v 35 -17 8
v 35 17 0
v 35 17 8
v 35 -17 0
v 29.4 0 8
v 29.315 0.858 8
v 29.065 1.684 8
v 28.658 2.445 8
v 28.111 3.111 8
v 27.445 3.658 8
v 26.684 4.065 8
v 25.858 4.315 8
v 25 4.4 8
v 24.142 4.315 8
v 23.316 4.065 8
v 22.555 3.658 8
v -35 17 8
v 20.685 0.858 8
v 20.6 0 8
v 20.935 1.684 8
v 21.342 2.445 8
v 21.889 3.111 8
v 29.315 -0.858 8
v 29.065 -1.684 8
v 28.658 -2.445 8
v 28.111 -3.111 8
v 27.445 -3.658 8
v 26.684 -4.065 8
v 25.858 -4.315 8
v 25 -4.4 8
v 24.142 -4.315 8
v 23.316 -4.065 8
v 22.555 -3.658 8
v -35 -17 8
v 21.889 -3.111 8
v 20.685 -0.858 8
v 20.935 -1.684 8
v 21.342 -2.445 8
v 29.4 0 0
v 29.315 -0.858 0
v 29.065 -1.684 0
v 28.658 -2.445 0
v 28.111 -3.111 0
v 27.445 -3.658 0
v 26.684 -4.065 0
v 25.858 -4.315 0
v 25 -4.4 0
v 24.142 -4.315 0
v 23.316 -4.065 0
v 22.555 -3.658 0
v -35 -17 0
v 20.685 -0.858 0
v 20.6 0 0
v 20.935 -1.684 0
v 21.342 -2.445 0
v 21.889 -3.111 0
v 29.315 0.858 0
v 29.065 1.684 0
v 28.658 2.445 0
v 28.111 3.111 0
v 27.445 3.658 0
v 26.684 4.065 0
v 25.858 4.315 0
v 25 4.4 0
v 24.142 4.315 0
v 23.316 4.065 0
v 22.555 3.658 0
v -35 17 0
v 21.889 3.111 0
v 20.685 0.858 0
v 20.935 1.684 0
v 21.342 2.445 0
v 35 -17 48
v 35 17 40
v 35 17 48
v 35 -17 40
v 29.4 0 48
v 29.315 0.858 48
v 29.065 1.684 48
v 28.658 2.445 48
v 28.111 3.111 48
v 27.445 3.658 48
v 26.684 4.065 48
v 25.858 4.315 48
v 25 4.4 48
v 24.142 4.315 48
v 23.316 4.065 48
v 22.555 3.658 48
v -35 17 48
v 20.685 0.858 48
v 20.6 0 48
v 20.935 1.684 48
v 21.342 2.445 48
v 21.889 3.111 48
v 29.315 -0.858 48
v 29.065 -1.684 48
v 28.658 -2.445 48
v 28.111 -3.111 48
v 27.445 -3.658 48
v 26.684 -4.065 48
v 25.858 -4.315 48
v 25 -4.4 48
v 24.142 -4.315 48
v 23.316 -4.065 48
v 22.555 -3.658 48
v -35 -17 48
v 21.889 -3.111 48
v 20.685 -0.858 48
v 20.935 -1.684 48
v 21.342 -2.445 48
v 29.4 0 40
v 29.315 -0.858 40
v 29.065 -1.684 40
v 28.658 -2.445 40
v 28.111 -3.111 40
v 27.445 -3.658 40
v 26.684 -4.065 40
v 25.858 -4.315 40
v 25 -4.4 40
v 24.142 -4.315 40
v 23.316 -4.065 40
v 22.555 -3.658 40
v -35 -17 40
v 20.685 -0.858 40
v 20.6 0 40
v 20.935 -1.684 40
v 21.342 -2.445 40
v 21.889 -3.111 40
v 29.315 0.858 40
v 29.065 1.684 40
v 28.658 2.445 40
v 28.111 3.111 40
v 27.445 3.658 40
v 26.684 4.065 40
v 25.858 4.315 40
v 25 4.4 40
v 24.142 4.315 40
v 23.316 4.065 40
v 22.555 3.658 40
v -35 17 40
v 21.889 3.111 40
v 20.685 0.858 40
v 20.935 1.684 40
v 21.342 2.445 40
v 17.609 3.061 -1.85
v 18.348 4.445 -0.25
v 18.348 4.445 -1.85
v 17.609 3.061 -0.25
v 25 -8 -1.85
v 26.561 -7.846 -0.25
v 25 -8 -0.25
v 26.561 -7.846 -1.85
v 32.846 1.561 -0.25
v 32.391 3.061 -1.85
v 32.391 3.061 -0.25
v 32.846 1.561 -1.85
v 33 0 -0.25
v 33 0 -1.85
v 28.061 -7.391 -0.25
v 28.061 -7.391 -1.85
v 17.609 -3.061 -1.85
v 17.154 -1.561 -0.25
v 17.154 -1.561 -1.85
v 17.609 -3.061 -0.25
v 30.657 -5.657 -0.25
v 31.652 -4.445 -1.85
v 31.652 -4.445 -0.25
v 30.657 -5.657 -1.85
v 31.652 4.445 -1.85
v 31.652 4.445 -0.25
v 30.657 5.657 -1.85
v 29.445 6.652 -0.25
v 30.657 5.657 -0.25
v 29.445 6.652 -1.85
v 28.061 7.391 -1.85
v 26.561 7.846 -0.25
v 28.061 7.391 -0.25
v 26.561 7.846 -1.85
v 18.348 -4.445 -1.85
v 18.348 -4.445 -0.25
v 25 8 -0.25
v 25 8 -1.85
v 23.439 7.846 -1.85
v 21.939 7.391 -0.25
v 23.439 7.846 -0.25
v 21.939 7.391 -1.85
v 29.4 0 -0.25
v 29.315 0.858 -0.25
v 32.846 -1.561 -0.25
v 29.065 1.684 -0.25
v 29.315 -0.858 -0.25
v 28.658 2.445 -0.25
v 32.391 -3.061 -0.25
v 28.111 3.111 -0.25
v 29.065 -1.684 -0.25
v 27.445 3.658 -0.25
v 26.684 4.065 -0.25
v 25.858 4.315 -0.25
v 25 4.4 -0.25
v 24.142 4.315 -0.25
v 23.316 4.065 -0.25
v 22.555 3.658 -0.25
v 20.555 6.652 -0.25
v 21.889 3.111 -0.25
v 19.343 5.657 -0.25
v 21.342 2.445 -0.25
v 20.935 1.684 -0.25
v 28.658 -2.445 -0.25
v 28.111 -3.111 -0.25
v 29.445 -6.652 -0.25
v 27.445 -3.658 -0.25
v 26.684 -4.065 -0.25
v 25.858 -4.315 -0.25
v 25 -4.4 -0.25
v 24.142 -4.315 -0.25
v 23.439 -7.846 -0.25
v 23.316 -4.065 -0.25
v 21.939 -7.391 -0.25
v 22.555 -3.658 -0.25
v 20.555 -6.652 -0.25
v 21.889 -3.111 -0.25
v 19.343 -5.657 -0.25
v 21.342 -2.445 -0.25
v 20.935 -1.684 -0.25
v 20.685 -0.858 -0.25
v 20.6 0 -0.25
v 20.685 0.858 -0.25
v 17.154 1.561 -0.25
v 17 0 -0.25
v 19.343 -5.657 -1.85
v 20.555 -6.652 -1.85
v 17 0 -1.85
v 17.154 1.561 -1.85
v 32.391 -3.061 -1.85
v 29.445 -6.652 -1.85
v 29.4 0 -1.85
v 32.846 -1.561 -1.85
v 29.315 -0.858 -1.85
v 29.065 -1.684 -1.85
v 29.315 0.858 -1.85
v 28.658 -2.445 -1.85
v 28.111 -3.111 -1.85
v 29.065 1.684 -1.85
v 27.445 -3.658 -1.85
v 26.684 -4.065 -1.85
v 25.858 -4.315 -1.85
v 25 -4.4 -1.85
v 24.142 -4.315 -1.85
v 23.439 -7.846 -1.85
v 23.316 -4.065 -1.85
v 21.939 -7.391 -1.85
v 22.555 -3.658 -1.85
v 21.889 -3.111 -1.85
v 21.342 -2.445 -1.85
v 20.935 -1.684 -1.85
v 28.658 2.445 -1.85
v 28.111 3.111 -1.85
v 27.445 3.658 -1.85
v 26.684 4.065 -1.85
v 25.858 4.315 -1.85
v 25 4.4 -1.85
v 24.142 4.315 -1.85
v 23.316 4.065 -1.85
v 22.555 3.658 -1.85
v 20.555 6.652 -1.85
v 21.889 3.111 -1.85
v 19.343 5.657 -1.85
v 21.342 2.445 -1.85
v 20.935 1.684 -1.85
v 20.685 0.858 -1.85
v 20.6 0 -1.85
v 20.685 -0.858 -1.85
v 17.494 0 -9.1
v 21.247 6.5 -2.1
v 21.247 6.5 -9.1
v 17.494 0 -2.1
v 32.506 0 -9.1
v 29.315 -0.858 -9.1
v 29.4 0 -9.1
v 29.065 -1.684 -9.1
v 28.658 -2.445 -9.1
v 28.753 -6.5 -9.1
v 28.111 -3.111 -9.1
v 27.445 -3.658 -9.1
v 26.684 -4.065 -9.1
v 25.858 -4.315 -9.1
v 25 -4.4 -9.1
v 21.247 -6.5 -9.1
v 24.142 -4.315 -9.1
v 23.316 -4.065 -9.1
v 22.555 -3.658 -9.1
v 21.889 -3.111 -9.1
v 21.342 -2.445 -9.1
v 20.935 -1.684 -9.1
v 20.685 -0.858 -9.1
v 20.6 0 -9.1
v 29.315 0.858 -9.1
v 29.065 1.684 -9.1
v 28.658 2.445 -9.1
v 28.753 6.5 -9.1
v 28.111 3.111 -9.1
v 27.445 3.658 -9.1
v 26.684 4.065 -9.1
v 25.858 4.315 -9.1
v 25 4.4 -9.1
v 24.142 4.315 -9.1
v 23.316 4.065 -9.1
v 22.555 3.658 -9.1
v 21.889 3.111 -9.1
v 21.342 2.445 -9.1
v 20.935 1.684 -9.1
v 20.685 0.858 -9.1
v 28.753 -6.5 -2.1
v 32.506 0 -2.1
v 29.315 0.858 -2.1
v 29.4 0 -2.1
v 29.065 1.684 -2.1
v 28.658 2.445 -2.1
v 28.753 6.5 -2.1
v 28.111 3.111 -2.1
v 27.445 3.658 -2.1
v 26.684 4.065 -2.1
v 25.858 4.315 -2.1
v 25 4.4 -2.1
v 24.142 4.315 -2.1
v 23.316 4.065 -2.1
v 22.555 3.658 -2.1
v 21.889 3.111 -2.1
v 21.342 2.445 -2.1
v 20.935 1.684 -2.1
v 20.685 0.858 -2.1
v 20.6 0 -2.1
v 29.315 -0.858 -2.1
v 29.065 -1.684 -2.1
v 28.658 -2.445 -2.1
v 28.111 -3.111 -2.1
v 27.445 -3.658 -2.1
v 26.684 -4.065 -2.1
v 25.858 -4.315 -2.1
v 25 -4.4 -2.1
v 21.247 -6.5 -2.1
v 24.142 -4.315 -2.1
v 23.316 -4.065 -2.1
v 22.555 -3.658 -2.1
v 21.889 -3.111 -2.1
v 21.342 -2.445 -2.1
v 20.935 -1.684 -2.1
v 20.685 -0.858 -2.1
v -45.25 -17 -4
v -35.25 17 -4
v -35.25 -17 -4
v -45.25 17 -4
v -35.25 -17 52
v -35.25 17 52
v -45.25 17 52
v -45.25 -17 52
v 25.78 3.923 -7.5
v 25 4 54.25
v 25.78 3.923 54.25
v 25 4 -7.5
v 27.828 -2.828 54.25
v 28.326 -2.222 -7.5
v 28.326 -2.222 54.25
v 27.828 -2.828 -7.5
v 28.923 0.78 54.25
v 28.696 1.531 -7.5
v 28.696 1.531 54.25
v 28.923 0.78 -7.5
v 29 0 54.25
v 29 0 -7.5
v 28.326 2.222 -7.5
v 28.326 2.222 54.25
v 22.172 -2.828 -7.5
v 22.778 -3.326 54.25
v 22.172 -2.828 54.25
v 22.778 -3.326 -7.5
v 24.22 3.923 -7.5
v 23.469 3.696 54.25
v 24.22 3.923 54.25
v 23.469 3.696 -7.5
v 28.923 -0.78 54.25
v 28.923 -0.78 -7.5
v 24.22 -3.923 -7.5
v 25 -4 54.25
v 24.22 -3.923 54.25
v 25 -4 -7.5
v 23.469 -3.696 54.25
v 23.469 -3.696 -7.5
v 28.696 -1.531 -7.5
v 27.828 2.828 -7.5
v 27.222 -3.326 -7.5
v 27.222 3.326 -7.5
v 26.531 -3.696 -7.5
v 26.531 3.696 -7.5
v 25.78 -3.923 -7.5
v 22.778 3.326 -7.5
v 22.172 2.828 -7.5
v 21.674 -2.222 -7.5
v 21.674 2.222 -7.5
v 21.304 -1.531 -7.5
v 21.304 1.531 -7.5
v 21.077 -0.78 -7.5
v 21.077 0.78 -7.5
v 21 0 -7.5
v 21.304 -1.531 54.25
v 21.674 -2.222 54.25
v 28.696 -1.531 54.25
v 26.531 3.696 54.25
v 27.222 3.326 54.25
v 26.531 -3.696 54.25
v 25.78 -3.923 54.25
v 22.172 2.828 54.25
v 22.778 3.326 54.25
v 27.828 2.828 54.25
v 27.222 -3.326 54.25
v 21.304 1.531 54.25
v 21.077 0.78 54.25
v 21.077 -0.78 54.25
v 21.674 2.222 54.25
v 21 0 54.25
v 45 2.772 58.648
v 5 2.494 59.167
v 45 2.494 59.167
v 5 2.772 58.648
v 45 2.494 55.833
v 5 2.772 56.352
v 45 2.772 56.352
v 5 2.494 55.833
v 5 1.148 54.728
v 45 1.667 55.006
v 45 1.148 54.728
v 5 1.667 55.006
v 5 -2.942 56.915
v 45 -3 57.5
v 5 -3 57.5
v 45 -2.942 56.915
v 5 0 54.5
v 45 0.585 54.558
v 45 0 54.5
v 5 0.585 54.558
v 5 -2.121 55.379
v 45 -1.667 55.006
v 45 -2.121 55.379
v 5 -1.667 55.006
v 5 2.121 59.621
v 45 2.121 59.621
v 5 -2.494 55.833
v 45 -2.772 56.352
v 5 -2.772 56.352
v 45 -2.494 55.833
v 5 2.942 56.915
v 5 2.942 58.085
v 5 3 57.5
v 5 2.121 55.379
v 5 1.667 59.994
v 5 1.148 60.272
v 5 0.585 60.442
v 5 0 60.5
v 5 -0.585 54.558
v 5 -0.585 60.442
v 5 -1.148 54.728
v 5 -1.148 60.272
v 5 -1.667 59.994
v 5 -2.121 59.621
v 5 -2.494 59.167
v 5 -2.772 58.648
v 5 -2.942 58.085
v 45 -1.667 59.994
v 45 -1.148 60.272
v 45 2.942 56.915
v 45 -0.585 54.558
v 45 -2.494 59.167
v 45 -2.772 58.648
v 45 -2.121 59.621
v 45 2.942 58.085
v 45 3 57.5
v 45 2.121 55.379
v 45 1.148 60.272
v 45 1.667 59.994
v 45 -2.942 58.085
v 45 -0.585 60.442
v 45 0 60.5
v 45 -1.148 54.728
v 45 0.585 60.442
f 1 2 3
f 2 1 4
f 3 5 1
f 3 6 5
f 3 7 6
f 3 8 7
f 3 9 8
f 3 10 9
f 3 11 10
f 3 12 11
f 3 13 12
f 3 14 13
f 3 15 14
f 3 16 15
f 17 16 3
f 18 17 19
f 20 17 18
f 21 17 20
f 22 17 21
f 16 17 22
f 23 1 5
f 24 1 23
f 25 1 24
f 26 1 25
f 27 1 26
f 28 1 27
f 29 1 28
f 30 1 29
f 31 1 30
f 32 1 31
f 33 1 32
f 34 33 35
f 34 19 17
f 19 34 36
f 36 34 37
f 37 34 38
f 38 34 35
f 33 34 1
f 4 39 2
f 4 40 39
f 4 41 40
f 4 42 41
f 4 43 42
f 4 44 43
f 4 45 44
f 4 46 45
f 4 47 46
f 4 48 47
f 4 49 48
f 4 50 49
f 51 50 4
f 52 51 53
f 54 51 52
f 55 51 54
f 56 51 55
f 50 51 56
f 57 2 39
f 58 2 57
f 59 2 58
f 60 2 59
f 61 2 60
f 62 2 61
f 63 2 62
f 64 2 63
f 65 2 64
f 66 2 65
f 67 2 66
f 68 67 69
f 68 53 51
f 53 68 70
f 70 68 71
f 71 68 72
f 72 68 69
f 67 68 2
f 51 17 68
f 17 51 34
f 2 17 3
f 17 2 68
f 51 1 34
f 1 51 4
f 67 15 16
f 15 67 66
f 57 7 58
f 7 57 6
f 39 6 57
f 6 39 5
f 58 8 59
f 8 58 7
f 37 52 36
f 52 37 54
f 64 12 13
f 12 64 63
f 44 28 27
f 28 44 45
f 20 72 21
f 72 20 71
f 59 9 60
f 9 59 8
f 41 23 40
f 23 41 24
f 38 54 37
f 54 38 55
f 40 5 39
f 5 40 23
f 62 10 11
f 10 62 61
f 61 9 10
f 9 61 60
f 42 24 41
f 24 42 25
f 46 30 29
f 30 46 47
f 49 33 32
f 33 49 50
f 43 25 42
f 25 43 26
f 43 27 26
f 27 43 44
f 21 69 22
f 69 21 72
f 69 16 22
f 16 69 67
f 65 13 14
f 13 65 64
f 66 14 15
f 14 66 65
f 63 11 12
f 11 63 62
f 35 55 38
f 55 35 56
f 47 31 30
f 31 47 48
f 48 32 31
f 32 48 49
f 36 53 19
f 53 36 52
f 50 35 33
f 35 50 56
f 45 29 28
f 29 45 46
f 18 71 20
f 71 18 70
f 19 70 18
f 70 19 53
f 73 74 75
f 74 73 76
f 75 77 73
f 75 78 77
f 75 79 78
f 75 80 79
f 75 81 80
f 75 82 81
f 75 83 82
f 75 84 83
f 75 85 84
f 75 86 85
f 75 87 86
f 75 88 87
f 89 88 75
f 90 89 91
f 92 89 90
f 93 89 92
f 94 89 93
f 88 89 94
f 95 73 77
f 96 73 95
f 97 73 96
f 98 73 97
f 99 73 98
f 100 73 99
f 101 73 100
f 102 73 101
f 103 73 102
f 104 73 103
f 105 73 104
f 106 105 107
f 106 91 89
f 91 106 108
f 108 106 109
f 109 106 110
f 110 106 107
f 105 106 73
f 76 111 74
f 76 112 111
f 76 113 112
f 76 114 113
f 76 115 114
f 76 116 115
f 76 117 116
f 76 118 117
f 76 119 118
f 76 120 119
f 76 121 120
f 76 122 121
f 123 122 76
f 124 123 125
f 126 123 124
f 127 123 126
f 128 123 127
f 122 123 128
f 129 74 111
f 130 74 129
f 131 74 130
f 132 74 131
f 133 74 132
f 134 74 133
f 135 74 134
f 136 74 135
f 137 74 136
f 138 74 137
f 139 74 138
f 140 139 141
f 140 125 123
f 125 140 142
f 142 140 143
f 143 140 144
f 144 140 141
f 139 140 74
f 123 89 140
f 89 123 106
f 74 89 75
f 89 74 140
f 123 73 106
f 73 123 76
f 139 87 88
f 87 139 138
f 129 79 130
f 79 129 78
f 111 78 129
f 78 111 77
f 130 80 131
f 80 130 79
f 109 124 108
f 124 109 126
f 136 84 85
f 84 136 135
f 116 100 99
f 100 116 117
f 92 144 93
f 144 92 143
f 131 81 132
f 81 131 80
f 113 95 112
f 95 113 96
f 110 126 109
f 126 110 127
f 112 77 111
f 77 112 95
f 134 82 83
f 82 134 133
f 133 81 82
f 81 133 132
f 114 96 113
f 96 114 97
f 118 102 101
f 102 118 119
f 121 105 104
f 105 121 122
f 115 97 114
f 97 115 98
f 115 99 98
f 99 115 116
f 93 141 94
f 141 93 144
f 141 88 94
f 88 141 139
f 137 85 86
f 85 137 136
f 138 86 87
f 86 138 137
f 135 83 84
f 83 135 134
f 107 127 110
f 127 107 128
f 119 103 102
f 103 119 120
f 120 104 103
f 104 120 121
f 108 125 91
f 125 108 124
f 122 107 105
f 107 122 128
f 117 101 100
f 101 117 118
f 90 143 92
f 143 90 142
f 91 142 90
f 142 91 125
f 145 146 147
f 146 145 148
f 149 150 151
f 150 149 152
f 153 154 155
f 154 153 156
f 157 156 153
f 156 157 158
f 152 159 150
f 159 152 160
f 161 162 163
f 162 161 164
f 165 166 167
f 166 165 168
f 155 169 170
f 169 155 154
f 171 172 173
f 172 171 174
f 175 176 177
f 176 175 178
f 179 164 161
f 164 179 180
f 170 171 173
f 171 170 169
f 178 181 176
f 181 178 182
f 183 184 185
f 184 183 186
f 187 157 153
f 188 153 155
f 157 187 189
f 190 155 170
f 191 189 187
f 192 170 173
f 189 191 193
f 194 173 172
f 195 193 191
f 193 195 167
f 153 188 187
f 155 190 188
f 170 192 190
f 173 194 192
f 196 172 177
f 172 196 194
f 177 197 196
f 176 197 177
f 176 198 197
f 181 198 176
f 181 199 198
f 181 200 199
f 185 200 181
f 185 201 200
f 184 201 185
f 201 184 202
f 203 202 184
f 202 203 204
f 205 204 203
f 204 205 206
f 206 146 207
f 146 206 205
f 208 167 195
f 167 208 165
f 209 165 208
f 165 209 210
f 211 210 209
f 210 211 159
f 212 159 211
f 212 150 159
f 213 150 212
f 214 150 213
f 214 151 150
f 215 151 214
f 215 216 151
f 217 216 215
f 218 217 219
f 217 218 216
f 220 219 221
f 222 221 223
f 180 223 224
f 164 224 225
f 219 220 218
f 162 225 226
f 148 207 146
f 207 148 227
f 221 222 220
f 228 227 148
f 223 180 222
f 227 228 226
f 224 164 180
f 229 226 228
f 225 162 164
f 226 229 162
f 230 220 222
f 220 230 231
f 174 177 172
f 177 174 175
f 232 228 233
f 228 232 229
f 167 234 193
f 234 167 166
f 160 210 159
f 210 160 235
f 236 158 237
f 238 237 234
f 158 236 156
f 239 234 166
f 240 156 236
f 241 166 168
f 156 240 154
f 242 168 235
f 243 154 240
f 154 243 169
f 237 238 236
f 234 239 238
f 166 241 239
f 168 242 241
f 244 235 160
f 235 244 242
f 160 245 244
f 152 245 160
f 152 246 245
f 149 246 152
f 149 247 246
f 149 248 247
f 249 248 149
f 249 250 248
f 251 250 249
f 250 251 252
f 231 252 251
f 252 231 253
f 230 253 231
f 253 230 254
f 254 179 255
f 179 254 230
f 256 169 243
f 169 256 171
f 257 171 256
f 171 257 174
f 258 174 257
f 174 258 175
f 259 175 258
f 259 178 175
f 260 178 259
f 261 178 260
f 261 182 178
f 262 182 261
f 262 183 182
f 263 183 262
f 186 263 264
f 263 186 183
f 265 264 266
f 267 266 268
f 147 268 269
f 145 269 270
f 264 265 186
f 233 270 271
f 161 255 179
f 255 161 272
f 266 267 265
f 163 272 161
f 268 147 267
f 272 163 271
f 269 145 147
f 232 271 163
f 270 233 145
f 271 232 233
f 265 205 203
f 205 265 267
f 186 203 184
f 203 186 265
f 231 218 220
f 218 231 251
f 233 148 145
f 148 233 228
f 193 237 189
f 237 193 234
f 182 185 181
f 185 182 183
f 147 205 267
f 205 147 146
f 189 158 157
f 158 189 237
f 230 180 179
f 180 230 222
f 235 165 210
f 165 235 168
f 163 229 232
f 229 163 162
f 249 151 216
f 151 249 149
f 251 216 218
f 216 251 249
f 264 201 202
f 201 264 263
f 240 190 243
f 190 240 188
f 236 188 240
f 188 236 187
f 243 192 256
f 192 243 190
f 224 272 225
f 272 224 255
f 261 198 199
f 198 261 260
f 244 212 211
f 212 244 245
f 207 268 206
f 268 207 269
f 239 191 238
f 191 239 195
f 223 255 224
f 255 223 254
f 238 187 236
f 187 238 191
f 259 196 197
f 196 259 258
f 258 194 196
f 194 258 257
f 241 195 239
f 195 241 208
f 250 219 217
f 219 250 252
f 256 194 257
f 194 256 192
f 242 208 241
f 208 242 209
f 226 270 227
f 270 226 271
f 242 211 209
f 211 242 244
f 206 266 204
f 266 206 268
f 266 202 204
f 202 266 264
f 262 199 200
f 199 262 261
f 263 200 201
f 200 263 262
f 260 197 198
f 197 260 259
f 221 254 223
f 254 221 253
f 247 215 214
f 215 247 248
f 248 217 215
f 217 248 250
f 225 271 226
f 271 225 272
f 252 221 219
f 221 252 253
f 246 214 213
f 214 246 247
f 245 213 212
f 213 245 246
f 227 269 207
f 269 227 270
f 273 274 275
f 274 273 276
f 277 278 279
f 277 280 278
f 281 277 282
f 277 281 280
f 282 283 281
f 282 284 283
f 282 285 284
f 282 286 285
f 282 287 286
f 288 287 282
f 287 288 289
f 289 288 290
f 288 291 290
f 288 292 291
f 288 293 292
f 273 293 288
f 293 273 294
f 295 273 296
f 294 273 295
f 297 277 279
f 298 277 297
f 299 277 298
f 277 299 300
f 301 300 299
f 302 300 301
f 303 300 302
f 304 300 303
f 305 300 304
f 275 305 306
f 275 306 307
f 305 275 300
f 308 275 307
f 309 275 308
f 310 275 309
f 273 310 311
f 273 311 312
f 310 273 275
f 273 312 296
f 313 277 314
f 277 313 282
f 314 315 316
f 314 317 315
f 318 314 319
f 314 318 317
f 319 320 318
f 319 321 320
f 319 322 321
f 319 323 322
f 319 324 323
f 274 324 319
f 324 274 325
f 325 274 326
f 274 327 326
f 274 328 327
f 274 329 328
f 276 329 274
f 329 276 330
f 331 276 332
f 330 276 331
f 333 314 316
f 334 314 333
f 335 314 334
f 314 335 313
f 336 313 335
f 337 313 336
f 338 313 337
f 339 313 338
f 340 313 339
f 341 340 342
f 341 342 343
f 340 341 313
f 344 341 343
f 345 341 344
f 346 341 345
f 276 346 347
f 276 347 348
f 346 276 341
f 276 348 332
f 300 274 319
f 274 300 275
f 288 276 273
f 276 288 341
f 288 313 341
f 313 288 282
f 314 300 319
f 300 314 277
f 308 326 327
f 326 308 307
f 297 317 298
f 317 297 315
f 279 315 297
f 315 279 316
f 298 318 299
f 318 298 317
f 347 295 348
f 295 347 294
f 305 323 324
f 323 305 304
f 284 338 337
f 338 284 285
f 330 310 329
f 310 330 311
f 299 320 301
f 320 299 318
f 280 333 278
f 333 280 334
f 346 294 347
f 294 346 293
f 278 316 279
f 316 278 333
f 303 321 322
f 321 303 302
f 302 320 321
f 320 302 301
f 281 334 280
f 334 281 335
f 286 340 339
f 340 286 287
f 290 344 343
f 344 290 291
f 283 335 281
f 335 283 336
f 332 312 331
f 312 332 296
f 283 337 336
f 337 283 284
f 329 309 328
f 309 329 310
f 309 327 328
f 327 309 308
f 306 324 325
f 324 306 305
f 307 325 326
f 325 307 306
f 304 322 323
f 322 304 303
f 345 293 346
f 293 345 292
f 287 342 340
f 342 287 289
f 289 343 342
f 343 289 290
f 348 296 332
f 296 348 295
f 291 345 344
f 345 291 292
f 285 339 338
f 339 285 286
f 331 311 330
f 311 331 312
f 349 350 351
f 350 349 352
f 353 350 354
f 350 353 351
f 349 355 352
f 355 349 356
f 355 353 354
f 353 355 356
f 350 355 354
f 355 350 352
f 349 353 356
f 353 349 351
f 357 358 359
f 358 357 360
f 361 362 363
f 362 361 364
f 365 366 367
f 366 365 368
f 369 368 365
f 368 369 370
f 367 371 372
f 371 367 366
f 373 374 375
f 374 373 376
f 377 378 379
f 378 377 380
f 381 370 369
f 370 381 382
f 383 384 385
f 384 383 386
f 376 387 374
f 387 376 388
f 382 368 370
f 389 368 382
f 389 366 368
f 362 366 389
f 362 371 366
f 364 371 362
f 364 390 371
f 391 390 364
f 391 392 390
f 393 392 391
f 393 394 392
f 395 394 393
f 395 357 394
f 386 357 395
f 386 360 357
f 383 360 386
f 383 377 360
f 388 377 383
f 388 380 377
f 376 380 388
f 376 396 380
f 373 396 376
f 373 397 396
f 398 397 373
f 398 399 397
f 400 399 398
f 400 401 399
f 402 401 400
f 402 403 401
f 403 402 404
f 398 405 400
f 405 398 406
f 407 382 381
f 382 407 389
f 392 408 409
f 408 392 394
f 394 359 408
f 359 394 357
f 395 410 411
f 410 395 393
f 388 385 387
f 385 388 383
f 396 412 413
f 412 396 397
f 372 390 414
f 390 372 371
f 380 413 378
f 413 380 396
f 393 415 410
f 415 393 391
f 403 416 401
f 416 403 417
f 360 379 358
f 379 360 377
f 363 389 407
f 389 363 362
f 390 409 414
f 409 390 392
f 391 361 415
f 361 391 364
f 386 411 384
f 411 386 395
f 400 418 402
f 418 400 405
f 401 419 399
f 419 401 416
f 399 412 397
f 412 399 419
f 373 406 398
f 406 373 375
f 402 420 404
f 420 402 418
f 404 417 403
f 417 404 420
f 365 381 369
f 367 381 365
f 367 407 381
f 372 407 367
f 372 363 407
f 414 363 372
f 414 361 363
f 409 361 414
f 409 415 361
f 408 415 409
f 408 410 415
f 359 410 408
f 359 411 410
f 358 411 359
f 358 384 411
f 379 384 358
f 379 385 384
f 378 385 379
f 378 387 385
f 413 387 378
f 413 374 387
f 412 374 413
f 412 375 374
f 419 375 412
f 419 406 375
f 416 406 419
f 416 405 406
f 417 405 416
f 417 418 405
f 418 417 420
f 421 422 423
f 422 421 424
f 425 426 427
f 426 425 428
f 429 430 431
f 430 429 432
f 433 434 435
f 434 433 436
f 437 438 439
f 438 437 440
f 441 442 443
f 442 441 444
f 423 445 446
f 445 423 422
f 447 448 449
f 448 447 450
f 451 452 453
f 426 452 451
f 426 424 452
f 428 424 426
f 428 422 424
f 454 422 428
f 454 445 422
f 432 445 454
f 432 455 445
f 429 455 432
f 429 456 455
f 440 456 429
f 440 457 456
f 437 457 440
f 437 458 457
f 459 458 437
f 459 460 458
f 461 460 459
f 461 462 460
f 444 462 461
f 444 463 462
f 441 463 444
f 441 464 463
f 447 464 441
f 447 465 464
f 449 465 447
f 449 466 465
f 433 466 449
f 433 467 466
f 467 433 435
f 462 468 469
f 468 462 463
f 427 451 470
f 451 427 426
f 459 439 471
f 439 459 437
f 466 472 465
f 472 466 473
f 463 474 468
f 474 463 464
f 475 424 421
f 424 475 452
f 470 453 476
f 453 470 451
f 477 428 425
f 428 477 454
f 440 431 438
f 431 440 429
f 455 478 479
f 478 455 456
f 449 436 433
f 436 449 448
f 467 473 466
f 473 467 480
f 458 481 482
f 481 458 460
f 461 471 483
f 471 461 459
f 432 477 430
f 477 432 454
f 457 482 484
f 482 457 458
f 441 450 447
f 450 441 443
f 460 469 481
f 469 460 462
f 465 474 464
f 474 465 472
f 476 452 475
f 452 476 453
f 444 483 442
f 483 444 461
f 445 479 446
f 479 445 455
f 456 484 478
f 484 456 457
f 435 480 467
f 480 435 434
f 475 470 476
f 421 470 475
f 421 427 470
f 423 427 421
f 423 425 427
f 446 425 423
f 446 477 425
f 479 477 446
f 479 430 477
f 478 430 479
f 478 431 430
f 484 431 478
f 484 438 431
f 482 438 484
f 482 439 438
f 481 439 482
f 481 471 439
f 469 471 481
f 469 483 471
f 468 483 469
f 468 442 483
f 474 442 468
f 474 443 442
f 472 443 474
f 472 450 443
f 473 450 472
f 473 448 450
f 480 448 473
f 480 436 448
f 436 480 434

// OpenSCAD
$fn = 32;

// ------------------------------------------------------------------------
// C clamp: throat 40 mm, screw d8
// Every part is its own module, assembly() places every instance.
// ------------------------------------------------------------------------

// --- part 1 ---
module clamp_arm() {
  difference() {
    translate([-35, -17, 0]) cube([70, 34, 8]);
    translate([25, 0, -1]) cylinder(h = 10, d = 8.8);
  }
}

// --- part 2 ---
module clamp_spine() {
  difference() {
    translate([-28, -17, 0]) cube([56, 34, 10]);
  }
}

// --- part 3 ---
module clamp_screw() {
  translate([0, 0, -30.875]) cylinder(h = 61.75, d = 8);
}

// --- part 4 ---
module clamp_washer() {
  difference() {
      translate([0, 0, 0]) cylinder(h = 1.6, d = 16);
      translate([0, 0, -1]) cylinder(h = 3.6, d = 8.8);
    }
}

// --- part 5 ---
module clamp_nut() {
  difference() {
    linear_extrude(height = 7) polygon(points = [[7.506, 0], [3.753, 6.5], [-3.753, 6.5], [-7.506, 0], [-3.753, -6.5], [3.753, -6.5]]);
    translate([0, 0, -1]) cylinder(h = 9, d = 8.8);
  }
}

// --- part 6 ---
module tommy_bar() {
  translate([0, 0, -20]) cylinder(h = 40, d = 6);
}

// --- assembly ---
module assembly() {
  color([0.80, 0.24, 0.20]) translate([0, 0, 0]) rotate([0, 0, 0]) clamp_arm();
  color([0.20, 0.45, 0.75]) translate([0, 0, 40]) rotate([0, 0, 0]) clamp_arm();
  color([0.25, 0.62, 0.32]) translate([-45.25, 0, 24]) rotate([0, 90, 0]) clamp_spine();
  color([0.92, 0.70, 0.18]) translate([25, 0, 23.375]) rotate([0, 0, 0]) clamp_screw();
  color([0.58, 0.35, 0.70]) translate([25, 0, -1.85]) rotate([0, 0, 0]) clamp_washer();
  color([0.16, 0.66, 0.66]) translate([25, 0, -9.1]) rotate([0, 0, 0]) clamp_nut();
  color([0.85, 0.48, 0.18]) translate([25, 0, 57.5]) rotate([0, 90, 0]) tommy_bar();
}

assembly();
